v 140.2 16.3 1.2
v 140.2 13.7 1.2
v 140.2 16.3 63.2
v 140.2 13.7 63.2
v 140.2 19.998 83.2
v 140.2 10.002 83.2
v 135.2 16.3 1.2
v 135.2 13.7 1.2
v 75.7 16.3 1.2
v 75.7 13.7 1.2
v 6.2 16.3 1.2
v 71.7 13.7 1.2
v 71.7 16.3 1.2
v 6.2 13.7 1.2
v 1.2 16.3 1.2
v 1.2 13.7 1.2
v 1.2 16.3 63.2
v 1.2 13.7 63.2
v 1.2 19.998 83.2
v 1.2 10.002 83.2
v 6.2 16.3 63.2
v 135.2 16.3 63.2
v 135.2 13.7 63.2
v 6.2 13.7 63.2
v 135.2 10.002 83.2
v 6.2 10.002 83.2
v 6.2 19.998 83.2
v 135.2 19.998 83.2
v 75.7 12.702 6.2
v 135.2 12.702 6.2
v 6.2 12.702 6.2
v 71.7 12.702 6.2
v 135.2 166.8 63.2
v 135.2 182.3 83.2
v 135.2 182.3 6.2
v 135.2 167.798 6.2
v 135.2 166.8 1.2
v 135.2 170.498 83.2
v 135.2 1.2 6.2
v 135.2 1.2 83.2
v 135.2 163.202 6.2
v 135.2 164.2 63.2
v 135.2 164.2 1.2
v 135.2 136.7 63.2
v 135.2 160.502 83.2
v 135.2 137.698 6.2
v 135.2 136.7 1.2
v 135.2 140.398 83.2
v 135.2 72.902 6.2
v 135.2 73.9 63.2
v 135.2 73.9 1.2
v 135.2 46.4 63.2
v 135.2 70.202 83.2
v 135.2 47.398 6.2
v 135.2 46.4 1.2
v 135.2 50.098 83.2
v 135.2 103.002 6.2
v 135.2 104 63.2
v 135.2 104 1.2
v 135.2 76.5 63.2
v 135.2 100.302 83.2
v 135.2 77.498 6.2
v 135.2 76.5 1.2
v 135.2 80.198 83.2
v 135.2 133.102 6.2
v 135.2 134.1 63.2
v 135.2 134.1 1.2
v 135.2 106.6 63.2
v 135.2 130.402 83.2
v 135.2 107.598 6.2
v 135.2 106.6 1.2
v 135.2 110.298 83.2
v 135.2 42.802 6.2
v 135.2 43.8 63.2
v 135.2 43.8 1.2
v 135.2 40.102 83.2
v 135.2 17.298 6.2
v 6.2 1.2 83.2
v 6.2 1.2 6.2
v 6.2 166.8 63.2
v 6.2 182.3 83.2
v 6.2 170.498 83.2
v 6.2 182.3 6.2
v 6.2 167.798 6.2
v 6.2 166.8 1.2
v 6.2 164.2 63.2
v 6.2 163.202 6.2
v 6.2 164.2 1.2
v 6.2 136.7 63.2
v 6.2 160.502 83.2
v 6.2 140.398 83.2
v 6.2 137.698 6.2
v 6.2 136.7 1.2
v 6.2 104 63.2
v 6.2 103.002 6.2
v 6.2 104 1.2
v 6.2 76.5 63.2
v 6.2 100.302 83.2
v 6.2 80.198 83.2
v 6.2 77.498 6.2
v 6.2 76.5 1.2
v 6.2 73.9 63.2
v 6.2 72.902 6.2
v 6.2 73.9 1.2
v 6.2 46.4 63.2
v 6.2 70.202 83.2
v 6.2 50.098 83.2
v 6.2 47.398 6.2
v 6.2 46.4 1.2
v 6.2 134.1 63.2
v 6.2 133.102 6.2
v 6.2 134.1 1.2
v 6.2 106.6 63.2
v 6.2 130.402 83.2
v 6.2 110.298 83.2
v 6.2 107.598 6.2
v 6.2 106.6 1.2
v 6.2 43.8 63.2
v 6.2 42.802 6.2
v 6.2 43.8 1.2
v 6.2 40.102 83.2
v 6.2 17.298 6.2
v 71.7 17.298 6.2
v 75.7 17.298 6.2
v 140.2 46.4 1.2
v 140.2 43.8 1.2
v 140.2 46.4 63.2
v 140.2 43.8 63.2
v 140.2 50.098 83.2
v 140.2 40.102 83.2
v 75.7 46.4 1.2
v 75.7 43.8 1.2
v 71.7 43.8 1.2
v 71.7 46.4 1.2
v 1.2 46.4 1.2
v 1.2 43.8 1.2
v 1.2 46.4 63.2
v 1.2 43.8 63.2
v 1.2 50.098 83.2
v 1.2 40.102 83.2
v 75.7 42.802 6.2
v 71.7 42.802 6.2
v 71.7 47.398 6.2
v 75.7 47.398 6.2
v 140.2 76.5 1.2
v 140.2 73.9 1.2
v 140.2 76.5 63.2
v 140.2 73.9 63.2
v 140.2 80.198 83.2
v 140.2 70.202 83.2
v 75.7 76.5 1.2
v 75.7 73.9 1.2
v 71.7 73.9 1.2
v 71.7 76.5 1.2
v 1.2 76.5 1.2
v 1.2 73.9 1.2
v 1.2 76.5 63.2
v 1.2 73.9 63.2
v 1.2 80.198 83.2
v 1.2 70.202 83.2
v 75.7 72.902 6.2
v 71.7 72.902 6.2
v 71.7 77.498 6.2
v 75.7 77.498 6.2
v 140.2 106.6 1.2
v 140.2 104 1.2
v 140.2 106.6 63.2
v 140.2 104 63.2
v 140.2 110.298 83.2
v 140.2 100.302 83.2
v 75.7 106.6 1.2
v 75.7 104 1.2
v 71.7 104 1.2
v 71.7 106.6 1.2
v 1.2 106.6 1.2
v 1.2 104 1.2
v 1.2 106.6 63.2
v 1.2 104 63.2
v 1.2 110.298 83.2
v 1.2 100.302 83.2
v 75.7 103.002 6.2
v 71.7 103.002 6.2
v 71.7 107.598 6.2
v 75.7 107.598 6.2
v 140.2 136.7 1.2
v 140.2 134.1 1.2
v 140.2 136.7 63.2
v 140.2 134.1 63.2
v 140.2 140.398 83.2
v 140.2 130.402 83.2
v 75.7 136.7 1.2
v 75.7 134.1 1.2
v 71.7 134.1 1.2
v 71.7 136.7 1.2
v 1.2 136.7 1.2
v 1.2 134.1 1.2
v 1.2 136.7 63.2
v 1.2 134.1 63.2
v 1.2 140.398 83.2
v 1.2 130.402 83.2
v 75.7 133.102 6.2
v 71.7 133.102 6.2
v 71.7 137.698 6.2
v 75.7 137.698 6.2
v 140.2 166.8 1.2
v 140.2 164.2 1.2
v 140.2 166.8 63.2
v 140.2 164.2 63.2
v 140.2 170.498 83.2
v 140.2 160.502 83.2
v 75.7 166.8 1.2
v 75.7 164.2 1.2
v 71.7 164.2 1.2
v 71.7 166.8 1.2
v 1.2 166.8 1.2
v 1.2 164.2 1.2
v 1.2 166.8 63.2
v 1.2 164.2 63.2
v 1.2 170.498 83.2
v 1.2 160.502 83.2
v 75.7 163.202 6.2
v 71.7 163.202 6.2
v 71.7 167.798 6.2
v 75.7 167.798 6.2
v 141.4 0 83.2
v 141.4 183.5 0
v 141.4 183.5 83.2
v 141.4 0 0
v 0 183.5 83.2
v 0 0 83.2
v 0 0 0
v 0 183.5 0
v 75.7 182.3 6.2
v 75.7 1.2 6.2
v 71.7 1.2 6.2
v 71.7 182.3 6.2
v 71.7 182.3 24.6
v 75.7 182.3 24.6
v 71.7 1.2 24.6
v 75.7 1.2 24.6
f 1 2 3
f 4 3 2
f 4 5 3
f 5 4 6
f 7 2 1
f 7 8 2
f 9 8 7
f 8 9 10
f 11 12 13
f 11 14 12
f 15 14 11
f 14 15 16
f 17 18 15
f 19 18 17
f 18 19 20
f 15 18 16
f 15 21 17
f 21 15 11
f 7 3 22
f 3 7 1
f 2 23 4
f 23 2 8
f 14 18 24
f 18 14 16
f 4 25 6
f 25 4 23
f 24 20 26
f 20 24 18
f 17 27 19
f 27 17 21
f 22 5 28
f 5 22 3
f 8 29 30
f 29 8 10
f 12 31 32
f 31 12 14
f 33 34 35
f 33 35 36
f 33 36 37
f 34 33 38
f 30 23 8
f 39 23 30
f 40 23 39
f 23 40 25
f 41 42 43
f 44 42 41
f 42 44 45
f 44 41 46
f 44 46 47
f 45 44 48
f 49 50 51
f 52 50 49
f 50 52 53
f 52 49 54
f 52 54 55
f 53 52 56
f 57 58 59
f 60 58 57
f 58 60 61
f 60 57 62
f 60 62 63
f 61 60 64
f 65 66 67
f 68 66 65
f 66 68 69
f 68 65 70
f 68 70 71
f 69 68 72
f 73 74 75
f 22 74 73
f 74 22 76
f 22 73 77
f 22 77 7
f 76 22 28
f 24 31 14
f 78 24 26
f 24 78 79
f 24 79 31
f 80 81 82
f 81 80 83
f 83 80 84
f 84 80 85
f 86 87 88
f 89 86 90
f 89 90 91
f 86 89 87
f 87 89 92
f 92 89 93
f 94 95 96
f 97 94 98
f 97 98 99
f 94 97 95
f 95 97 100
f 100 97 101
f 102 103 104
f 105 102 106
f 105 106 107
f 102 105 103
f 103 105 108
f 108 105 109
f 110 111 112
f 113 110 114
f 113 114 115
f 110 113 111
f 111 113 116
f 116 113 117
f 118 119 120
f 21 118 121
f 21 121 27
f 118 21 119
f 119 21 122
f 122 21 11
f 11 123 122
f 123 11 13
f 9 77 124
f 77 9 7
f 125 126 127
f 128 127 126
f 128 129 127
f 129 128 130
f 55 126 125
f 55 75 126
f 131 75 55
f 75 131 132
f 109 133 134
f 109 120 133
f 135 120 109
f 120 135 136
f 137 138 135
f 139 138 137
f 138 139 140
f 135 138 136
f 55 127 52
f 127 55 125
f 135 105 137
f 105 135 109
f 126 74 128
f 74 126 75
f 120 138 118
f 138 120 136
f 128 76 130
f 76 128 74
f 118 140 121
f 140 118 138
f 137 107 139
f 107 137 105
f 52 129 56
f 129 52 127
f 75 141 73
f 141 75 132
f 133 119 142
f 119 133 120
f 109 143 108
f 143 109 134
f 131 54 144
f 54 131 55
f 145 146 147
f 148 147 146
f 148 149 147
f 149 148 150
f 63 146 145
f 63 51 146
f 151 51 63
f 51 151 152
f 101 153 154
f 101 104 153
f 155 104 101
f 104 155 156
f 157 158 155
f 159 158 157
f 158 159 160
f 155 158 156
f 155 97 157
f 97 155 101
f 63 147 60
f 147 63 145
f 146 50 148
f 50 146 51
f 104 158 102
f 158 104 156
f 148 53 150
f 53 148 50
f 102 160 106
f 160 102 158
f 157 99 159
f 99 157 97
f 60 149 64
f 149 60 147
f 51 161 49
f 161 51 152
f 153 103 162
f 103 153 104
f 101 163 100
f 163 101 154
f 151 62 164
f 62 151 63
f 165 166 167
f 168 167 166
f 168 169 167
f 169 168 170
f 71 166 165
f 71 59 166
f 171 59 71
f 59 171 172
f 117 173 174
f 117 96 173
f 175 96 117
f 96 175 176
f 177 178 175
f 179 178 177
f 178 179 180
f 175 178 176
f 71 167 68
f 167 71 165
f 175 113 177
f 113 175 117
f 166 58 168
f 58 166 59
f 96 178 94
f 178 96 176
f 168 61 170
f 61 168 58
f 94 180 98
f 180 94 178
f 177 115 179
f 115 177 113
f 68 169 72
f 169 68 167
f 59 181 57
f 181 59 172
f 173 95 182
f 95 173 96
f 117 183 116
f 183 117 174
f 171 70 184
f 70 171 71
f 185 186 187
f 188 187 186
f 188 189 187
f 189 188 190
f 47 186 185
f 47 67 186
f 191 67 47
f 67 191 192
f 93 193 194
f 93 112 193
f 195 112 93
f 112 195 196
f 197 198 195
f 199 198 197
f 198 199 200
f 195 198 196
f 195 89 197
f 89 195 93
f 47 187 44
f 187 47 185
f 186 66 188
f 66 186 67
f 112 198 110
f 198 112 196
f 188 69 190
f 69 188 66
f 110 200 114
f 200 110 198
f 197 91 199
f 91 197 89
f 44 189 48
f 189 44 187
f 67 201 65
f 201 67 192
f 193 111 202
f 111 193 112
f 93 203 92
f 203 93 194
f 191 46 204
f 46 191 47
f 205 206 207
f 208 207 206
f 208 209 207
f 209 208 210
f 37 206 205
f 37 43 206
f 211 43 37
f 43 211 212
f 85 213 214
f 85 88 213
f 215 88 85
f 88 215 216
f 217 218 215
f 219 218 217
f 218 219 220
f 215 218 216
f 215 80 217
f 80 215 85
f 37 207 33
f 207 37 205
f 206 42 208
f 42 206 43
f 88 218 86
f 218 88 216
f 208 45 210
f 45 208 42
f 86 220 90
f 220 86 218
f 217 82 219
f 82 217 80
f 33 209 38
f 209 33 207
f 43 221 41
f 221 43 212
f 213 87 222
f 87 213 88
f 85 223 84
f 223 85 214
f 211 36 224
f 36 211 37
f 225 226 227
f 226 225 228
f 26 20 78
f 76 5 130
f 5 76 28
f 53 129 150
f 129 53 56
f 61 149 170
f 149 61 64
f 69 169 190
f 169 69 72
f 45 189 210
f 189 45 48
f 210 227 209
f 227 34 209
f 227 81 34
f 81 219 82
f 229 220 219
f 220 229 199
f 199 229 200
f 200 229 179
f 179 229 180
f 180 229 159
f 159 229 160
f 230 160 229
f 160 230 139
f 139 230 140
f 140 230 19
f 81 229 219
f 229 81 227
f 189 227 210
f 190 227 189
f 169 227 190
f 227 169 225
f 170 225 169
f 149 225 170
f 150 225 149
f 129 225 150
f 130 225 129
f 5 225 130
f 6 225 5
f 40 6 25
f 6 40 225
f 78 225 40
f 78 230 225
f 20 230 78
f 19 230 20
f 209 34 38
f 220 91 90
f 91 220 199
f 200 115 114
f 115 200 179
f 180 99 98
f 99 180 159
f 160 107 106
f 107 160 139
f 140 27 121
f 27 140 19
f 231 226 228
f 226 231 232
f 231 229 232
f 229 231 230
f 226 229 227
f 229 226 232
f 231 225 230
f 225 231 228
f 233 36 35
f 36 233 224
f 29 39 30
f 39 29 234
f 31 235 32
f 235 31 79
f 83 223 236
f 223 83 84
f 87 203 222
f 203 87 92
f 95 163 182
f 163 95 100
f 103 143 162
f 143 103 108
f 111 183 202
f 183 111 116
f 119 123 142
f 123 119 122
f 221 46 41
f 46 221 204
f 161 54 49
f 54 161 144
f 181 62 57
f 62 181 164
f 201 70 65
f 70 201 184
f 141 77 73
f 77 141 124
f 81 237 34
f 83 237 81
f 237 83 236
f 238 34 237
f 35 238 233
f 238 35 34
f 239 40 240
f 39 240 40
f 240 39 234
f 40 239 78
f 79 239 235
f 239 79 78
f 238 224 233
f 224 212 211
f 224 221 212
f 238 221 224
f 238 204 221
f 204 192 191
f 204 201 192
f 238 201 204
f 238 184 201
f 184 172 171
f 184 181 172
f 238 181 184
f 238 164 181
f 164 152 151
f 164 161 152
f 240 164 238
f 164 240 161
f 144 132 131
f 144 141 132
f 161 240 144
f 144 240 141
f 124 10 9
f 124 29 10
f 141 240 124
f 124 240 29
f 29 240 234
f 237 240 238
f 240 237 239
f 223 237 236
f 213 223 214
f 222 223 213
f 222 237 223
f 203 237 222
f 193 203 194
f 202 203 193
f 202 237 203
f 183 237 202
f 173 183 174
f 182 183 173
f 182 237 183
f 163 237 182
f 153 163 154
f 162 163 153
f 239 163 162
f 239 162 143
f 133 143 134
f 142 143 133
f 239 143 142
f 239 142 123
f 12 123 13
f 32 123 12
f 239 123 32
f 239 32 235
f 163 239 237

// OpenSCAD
use <D2Lib v2.scad>;

// Dimensions in mm
// Ender3 v2: x=224, y=212
// Ender3 v3: x=220, y=220
// battery box: 15.5 x 25.8 x 52.75 conn: 5.6 x 4.2
// microbit: 43.2 x 11 x 51.8
// cable: 60 x 7.2 x 66     16.4x7.2   10x6.2
//
// L: 1.2 + 3x (44.2 + .6 + 26.8) + .6 + 1.2 - .6 = 218.4
// W: 1.2 + 9x (7.2 + .6 + 15.5) + .6 + 1.2 - .6 = 216.9

count = 6;
game_width = 139;
game_height = 82;
game_pcb_thick = 1.6;
game_front_thick = 12;
game_back_thick = 15;

game_switch_h1 = 19;
game_switch_h2 = 23.4;
game_switch_xoff1 = 1;
game_switch_xoff2 = 5;

case_wall = 1.2;
case_bottom = 1.2;

wall_clearance = 1;
game_clearance = 1.5;
insert_margin = 1;

top_sleeve_w = 5;
top_sleeve_insert_w = 10;
top_sleeve_insert_h = 20;

bottom_sleeve_h = 5;
bottom_sleeve_insert_w = game_pcb_thick + insert_margin + 2;

// Init
$fn=$preview ? 20 : 50;
q = .01;
q2 = q*2;

game_thick = game_front_thick + game_pcb_thick + game_back_thick;
game_spacing = game_thick + game_clearance;
total_w = case_wall + game_width + case_wall;
total_l = case_wall + wall_clearance + game_thick * count + game_clearance * (count - 1) + wall_clearance + case_wall;
total_h = case_bottom + game_height;

echo("Total w: ", total_w);
echo("Total l: ", total_l);

difference()
{
    beam_xyz(0, total_w, 0, total_l, 0, total_h);
    beam_xyz(case_wall + top_sleeve_w, total_w - case_wall - top_sleeve_w, case_wall, total_l - case_wall, case_bottom + bottom_sleeve_h, total_h + q);
    
    for (i = [0:count-1])
    {
        // side and bottom cutouts
        margin = insert_margin / 2;
        beam_xyz(case_wall, total_w - case_wall,
        case_wall + wall_clearance + game_front_thick + game_spacing * i - margin,
        case_wall + wall_clearance + game_front_thick + game_spacing * i + game_pcb_thick + margin,
        case_bottom, total_h + q);
        
        // top insert
        dy = (top_sleeve_insert_w - (game_pcb_thick + insert_margin)) / 2;
        beam_xyz_slopedz4(case_wall, total_w - case_wall,
        case_wall + wall_clearance + game_front_thick + game_spacing * i - margin,
        case_wall + wall_clearance + game_front_thick + game_spacing * i + game_pcb_thick + margin,
        total_h - top_sleeve_insert_h, total_h + q,
        0,0,-dy,-dy);
        
        // bottom insert
        dy2 = (bottom_sleeve_insert_w - (game_pcb_thick + insert_margin)) / 2;
        beam_xyz_slopedz4(case_wall + top_sleeve_w, total_w - case_wall - top_sleeve_w,
        case_wall + wall_clearance + game_front_thick + game_spacing * i - margin,
        case_wall + wall_clearance + game_front_thick + game_spacing * i + game_pcb_thick + margin,
        case_bottom, case_bottom + bottom_sleeve_h + q,
        0,0,-dy2,-dy2);
    }
}

beam_xyz(total_w / 2 + game_switch_xoff1, total_w / 2 + game_switch_xoff2, 0, total_l, 0, case_bottom + game_switch_h2);
